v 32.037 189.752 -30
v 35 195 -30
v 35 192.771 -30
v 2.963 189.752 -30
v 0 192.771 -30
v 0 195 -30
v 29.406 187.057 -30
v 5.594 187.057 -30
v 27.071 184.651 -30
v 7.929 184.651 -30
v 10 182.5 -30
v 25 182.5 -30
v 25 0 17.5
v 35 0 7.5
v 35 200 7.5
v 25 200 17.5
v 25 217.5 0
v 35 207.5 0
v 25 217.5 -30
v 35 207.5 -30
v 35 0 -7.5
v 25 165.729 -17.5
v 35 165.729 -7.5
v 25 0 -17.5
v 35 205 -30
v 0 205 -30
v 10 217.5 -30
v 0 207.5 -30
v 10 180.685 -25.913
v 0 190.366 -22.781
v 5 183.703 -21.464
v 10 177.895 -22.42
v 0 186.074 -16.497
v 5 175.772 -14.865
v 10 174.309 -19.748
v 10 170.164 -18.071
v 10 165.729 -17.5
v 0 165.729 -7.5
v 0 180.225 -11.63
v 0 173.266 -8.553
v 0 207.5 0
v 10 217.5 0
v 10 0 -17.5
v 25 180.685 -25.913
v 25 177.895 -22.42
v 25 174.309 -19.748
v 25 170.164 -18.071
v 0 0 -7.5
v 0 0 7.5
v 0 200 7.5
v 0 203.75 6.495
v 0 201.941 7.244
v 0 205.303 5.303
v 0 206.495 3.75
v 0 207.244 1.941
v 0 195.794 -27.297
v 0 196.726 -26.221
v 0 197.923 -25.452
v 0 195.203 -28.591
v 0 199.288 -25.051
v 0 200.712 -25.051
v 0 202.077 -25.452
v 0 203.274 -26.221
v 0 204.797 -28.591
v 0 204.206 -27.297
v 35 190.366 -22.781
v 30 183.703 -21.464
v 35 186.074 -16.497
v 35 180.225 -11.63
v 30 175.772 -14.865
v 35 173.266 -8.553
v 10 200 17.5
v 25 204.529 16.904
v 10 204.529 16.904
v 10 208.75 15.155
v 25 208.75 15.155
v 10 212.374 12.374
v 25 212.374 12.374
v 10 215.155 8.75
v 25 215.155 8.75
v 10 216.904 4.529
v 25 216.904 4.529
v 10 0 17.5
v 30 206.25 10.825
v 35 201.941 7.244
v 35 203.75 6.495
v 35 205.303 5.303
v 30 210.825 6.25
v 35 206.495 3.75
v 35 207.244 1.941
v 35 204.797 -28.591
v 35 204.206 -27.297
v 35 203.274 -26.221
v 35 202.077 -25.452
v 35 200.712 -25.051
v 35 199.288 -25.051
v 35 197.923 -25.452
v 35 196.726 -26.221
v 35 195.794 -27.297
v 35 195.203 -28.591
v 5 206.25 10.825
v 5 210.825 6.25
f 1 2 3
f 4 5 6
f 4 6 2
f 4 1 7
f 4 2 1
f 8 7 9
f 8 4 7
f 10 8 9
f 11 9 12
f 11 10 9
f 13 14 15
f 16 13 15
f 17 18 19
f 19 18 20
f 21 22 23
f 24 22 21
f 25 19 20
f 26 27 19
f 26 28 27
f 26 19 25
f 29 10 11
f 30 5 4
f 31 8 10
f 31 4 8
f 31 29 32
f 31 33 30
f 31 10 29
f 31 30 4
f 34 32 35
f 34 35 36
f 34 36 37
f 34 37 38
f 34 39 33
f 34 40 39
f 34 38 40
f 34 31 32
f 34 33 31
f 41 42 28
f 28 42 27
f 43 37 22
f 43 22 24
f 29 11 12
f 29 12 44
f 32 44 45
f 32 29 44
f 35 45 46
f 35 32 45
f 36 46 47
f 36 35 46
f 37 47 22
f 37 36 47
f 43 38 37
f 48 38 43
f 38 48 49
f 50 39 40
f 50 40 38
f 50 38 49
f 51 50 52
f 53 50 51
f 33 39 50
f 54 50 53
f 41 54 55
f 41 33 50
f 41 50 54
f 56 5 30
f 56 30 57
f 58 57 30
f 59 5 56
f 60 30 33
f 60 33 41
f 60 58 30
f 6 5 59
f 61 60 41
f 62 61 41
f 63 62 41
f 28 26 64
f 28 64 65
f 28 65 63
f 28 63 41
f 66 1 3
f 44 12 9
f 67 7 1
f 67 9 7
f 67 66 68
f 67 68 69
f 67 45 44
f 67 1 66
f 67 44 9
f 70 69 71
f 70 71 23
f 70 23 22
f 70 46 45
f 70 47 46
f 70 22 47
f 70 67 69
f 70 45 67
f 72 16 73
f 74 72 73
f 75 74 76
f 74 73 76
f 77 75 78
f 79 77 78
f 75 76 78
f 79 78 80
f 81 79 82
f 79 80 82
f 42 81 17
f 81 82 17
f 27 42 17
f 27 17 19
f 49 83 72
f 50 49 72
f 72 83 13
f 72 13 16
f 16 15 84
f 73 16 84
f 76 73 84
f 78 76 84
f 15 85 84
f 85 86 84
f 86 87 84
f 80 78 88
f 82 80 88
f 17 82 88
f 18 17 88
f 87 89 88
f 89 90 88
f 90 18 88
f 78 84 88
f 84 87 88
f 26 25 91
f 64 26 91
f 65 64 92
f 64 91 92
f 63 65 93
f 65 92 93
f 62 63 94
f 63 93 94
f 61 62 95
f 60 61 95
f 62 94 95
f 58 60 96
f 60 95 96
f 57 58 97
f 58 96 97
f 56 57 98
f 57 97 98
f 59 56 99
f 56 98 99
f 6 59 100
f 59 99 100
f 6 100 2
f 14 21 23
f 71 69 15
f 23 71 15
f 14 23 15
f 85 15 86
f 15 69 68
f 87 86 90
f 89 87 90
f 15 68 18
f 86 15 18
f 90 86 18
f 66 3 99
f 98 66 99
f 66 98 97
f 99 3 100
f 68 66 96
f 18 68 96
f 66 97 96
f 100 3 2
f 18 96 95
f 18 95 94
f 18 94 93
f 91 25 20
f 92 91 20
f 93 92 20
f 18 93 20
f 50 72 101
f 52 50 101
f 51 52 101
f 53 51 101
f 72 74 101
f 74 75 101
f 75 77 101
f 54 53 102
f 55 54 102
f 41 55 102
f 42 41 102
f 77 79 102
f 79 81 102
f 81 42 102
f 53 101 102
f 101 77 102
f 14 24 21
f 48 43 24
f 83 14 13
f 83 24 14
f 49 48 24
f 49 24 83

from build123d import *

# Parameters (mm, degrees)
Y_KSEKLIK_EKSTR_ZYON4_DEPTH = 35
RADYUS1_R                   = 17.5
RADYUS2_R                   = 17.5
IZIM4_R                     = 5
KES_EKSTR_ZYON1_DEPTH       = 223.331396793
PAH1_SIZE                   = 10
PAH2_SIZE                   = 10
PAH4_SIZE                   = 10
PAH5_SIZE                   = 10


with BuildPart() as part:
    # Çizim3 → Yükseklik-Ekstrüzyon4 (new body)
    with BuildSketch(Plane(origin=(0, 0, 0), x_dir=(0, 0, -1), z_dir=(1, 0, 0))):
        Polygon((17.5, 182.5), (17.5, 0), (-17.5, 0), (-17.5, 217.5), (30, 217.5), (30, 182.5), align=None)
    extrude(amount=Y_KSEKLIK_EKSTR_ZYON4_DEPTH)

    # Radyus1
    radyus1_edges = [part.edges().sort_by_distance(p)[0] for p in [
        (17.5, 217.5, 17.5),
    ]]
    fillet(radyus1_edges, radius=RADYUS1_R)

    # Radyus2
    # the kernel refuses this fillet: 17.5 mm, written as the material it adds along each edge
    with BuildSketch(Plane(origin=(0, 182.5, -17.5), x_dir=(0, -1, 0), z_dir=(1, 0, 0))) as radyus2_piece_1:
        with BuildLine():
            CenterArc((16.770509831, 17.5), RADYUS2_R, 196.601549599, 73.398450401)
            Line((0, 12.5), (-0.335410197, 12.4))
            ThreePointArc((-0.335410197, 12.4), (-0.35, 6.25), (-0.35, 0))
            Line((-0.35, 0), (0, -0.35))
            Line((0, -0.35), (16.770509831, -0.35))
            Line((16.770509831, -0.35), (16.770509831, 0))
        make_face()
    extrude(amount=35)

    # Çizim4 → Kes-Ekstrüzyon1 (cut, through all)
    with BuildSketch(Plane(origin=(35, 0, 0), x_dir=(0, 0, -1), z_dir=(1, 0, 0))):
        with Locations((30, 200)):
            Circle(IZIM4_R)
    extrude(amount=-KES_EKSTR_ZYON1_DEPTH, mode=Mode.SUBTRACT)

    # Pah1
    pah1_edges = [part.edges().sort_by_distance(p)[0] for p in [
        (0, 100, 17.5),
        (0, 212.374368671, 12.374368671),
        (0, 217.5, -15),
    ]]
    chamfer(pah1_edges, length=PAH1_SIZE)

    # Pah2
    pah2_edges = [part.edges().sort_by_distance(p)[0] for p in [
        (35, 217.5, -15),
        (35, 100, 17.5),
        (35, 212.374368671, 12.374368671),
    ]]
    chamfer(pah2_edges, length=PAH2_SIZE)

    # Pah4
    pah4_edges = [part.edges().sort_by_distance(p)[0] for p in [
        (35, 82.864745084, -17.5),
        (35, 176.1877405, -20.9687848),
    ]]
    chamfer(pah4_edges, length=PAH4_SIZE)

    # Pah5
    pah5_edges = [part.edges().sort_by_distance(p)[0] for p in [
        (0, 176.1877405, -20.9687848),
        (0, 82.864745084, -17.5),
    ]]
    chamfer(pah5_edges, length=PAH5_SIZE)


solid = part.part
